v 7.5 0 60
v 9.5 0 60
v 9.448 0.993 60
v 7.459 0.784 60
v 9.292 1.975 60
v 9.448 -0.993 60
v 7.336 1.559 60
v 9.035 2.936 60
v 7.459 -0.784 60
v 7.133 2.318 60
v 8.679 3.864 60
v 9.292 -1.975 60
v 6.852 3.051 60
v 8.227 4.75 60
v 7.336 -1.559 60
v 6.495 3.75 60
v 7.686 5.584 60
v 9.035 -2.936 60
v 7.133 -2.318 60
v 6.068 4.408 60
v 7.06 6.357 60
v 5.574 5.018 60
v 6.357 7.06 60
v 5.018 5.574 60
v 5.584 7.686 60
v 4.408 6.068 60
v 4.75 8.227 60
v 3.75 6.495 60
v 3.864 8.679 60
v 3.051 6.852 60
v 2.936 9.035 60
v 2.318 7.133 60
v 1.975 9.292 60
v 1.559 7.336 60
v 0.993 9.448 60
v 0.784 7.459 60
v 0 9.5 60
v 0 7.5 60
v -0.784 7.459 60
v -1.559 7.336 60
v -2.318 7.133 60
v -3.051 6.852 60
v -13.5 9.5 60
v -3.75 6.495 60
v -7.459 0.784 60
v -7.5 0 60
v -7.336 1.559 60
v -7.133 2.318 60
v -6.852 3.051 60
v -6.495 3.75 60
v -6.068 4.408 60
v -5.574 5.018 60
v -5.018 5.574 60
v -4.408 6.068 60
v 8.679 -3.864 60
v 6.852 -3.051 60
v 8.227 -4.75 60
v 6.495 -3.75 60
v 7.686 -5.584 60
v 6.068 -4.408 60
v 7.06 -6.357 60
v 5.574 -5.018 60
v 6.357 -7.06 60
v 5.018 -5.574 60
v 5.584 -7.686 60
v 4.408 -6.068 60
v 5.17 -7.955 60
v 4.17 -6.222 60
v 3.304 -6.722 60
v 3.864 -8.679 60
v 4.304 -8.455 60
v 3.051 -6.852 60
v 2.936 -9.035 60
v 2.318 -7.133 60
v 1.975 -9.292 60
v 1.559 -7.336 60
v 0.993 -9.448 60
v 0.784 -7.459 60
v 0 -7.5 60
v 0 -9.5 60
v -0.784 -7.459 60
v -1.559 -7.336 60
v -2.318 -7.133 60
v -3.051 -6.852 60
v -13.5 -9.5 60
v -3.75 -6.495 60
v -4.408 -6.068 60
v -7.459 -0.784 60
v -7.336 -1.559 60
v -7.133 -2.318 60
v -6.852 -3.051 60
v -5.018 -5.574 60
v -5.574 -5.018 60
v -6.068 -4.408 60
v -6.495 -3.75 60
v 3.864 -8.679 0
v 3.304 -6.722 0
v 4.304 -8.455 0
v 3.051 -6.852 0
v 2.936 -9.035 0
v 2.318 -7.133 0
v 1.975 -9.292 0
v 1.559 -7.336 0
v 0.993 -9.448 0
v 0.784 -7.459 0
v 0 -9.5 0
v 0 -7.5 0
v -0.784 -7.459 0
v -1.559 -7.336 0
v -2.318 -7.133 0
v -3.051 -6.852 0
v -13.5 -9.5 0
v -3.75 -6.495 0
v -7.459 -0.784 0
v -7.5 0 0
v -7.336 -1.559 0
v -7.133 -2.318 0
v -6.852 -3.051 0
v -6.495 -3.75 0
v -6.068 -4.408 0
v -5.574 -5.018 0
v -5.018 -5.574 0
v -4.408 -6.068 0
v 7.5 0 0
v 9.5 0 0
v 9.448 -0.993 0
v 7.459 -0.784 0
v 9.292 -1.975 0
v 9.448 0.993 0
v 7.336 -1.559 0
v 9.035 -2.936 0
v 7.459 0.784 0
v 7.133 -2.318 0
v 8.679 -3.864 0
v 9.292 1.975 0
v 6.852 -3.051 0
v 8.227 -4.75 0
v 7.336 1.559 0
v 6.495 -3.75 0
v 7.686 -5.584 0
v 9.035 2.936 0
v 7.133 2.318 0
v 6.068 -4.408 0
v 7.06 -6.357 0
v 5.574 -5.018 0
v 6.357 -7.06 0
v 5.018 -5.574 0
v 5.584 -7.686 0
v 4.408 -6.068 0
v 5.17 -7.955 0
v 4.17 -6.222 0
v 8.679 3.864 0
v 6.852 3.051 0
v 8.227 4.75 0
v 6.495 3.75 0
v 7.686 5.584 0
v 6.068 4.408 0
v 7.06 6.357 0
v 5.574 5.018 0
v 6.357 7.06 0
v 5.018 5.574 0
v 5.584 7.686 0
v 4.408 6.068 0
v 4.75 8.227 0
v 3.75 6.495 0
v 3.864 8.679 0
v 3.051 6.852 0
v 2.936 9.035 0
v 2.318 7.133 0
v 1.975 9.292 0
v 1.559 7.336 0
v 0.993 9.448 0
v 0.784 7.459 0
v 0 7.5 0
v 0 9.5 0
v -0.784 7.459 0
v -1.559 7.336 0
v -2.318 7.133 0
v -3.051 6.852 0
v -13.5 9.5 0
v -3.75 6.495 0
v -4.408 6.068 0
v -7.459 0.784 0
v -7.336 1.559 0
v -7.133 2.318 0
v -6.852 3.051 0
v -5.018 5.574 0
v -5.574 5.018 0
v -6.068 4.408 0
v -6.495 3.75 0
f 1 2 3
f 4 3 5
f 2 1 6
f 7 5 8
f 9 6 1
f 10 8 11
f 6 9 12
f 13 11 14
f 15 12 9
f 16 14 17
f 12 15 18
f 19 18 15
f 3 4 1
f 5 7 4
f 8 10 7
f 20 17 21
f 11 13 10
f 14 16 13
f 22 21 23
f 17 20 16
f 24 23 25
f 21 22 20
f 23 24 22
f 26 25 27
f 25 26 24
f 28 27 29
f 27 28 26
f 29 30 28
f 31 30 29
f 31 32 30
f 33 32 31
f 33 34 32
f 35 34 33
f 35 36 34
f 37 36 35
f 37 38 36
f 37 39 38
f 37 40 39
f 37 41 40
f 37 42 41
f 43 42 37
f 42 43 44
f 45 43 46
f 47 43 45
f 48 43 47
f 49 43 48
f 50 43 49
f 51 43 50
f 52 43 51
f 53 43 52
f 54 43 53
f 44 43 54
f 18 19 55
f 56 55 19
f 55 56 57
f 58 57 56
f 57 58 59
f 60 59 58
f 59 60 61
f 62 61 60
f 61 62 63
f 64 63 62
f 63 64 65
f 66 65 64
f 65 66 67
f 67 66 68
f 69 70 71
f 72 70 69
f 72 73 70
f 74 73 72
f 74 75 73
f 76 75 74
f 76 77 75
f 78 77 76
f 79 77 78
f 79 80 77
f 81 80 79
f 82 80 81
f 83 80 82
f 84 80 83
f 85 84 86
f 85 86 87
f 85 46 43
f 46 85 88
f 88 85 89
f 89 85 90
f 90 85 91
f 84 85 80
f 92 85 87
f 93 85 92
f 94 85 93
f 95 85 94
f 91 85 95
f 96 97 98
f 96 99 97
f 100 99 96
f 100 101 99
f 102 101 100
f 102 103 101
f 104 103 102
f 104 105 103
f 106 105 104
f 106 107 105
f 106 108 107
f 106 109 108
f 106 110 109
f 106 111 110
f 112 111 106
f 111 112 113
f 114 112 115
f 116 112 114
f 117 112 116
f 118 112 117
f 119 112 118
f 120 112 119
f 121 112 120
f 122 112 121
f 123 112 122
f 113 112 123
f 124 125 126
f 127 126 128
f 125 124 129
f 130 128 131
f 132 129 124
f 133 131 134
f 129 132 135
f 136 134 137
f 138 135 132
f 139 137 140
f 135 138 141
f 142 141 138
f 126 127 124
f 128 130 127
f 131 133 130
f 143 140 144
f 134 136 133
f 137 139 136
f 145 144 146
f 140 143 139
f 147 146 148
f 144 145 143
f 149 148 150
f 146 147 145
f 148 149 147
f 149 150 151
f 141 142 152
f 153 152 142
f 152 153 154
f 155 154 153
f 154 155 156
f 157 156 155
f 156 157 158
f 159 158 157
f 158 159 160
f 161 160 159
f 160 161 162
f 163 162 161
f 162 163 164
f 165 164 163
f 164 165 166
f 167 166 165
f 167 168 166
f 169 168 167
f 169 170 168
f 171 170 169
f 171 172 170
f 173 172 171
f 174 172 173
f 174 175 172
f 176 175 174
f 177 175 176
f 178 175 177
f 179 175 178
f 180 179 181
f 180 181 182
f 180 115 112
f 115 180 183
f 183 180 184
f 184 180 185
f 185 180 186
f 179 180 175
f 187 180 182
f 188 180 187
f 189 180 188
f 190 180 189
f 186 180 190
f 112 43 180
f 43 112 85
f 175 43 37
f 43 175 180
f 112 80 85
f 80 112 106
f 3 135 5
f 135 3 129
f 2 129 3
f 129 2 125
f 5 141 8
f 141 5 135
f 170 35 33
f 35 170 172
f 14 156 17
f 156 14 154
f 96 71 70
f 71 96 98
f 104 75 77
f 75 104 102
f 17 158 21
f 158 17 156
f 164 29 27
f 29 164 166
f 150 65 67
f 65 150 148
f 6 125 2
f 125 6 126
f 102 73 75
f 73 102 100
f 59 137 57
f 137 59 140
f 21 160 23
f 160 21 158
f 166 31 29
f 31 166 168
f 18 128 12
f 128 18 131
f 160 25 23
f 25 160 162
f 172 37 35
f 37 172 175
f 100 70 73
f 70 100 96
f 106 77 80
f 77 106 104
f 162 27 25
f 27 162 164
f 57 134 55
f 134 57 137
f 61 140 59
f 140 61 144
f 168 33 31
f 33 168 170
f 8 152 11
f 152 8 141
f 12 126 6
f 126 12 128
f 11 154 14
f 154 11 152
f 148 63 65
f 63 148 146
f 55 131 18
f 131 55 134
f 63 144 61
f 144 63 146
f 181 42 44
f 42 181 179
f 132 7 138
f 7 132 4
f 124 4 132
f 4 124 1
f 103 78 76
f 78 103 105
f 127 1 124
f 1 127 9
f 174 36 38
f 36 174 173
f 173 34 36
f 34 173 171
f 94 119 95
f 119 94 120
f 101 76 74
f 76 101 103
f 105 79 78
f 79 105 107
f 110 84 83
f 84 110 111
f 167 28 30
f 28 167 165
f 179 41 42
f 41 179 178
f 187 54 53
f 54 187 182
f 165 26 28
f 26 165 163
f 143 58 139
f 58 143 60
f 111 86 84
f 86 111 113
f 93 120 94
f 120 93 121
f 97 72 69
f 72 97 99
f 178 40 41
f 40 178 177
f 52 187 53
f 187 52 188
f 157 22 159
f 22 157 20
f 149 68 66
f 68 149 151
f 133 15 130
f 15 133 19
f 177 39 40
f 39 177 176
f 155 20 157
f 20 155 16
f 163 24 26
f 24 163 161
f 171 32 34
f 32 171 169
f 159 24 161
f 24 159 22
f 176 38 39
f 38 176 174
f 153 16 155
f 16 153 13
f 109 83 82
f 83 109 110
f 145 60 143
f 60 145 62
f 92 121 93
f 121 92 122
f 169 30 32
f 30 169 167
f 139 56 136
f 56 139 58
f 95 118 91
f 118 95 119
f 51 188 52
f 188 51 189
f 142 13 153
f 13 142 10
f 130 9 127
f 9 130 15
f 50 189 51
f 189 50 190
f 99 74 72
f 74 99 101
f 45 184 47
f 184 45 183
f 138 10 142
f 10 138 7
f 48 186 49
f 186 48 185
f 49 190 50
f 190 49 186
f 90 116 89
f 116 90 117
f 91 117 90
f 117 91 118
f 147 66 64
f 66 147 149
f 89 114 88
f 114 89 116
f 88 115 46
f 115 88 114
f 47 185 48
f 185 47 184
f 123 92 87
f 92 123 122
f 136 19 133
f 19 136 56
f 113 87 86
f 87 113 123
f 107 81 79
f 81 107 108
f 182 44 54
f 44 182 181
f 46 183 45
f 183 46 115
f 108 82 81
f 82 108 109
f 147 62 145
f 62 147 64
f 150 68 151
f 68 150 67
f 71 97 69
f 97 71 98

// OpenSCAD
// PRUSA iteration3
// Bearing holders
// GNU GPL v3
// Josef Průša <iam@josefprusa.cz> and contributors
// http://www.reprap.org/wiki/Prusa_Mendel
// http://prusamendel.org

bearing_diameter = 15;

module horizontal_bearing_base(bearings=1){
 translate(v=[0,0,6]) cube(size = [24,8+bearings*25,12], center = true);	
}
module horizontal_bearing_holes(bearings=1){
 cutter_lenght = 10+bearings*25;
 one_holder_lenght = 8+25;
 holder_lenght = 8+bearings*25;
 
 // Main bearing cut
 difference(){
  translate(v=[0,0,12]) rotate(a=[90,0,0]) translate(v=[0,0,-cutter_lenght/2]) cylinder(h = cutter_lenght, r=bearing_diameter/2, $fn=50);
  // Bearing retainers
  translate(v=[0,1-holder_lenght/2,3]) cube(size = [24,6,8], center = true);
  translate(v=[0,-1+holder_lenght/2,3]) cube(size = [24,6,8], center = true);
 }
 
 // Ziptie cutouts
 ziptie_cut_ofset = 0;
 for ( i = [0 : bearings-1] ){
  // For easier positioning I move them by half of one 
  // bearing holder then add each bearign lenght and then center again
  translate(v=[0,-holder_lenght/2,0]) translate(v=[0,one_holder_lenght/2+i*25,0]) difference(){
   union(){
    translate(v=[0,2-6,12]) rotate(a=[90,0,0]) translate(v=[0,0,0]) cylinder(h = 4, r=12.5, $fn=50);
    translate(v=[0,2+6,12]) rotate(a=[90,0,0]) translate(v=[0,0,0]) cylinder(h = 4, r=12.5, $fn=50);
   }
   translate(v=[0,10,12]) rotate(a=[90,0,0]) translate(v=[0,0,0]) cylinder(h = 24, r=10, $fn=50);
  }
 }
 
}

module horizontal_bearing_test(){
 difference(){
  horizontal_bearing_base(1);
  horizontal_bearing_holes(1);
 }
 translate(v=[30,0,0]) difference(){
  horizontal_bearing_base(2);
  horizontal_bearing_holes(2);
 }
 translate(v=[60,0,0]) difference(){
  horizontal_bearing_base(3);
  horizontal_bearing_holes(3);
 }
}



thinwall = 2;
bearing_size = bearing_diameter + 2 * thinwall;

module vertical_bearing_base(){
 translate(v=[-2-bearing_size/4,0,30]) cube(size = [4+bearing_size/2,bearing_size,60], center = true);
 cylinder(h = 60, r=bearing_size/2, $fn = 60);
}

module vertical_bearing_holes(){
  translate(v=[0,0,-1]) cylinder(h = 62, r=bearing_diameter/2, $fn = 60);
  rotate(a=[0,0,-60]) translate(v=[10,0,31]) cube(size = [10,1,62], center = true);
}

difference(){
vertical_bearing_base();
vertical_bearing_holes();
}
